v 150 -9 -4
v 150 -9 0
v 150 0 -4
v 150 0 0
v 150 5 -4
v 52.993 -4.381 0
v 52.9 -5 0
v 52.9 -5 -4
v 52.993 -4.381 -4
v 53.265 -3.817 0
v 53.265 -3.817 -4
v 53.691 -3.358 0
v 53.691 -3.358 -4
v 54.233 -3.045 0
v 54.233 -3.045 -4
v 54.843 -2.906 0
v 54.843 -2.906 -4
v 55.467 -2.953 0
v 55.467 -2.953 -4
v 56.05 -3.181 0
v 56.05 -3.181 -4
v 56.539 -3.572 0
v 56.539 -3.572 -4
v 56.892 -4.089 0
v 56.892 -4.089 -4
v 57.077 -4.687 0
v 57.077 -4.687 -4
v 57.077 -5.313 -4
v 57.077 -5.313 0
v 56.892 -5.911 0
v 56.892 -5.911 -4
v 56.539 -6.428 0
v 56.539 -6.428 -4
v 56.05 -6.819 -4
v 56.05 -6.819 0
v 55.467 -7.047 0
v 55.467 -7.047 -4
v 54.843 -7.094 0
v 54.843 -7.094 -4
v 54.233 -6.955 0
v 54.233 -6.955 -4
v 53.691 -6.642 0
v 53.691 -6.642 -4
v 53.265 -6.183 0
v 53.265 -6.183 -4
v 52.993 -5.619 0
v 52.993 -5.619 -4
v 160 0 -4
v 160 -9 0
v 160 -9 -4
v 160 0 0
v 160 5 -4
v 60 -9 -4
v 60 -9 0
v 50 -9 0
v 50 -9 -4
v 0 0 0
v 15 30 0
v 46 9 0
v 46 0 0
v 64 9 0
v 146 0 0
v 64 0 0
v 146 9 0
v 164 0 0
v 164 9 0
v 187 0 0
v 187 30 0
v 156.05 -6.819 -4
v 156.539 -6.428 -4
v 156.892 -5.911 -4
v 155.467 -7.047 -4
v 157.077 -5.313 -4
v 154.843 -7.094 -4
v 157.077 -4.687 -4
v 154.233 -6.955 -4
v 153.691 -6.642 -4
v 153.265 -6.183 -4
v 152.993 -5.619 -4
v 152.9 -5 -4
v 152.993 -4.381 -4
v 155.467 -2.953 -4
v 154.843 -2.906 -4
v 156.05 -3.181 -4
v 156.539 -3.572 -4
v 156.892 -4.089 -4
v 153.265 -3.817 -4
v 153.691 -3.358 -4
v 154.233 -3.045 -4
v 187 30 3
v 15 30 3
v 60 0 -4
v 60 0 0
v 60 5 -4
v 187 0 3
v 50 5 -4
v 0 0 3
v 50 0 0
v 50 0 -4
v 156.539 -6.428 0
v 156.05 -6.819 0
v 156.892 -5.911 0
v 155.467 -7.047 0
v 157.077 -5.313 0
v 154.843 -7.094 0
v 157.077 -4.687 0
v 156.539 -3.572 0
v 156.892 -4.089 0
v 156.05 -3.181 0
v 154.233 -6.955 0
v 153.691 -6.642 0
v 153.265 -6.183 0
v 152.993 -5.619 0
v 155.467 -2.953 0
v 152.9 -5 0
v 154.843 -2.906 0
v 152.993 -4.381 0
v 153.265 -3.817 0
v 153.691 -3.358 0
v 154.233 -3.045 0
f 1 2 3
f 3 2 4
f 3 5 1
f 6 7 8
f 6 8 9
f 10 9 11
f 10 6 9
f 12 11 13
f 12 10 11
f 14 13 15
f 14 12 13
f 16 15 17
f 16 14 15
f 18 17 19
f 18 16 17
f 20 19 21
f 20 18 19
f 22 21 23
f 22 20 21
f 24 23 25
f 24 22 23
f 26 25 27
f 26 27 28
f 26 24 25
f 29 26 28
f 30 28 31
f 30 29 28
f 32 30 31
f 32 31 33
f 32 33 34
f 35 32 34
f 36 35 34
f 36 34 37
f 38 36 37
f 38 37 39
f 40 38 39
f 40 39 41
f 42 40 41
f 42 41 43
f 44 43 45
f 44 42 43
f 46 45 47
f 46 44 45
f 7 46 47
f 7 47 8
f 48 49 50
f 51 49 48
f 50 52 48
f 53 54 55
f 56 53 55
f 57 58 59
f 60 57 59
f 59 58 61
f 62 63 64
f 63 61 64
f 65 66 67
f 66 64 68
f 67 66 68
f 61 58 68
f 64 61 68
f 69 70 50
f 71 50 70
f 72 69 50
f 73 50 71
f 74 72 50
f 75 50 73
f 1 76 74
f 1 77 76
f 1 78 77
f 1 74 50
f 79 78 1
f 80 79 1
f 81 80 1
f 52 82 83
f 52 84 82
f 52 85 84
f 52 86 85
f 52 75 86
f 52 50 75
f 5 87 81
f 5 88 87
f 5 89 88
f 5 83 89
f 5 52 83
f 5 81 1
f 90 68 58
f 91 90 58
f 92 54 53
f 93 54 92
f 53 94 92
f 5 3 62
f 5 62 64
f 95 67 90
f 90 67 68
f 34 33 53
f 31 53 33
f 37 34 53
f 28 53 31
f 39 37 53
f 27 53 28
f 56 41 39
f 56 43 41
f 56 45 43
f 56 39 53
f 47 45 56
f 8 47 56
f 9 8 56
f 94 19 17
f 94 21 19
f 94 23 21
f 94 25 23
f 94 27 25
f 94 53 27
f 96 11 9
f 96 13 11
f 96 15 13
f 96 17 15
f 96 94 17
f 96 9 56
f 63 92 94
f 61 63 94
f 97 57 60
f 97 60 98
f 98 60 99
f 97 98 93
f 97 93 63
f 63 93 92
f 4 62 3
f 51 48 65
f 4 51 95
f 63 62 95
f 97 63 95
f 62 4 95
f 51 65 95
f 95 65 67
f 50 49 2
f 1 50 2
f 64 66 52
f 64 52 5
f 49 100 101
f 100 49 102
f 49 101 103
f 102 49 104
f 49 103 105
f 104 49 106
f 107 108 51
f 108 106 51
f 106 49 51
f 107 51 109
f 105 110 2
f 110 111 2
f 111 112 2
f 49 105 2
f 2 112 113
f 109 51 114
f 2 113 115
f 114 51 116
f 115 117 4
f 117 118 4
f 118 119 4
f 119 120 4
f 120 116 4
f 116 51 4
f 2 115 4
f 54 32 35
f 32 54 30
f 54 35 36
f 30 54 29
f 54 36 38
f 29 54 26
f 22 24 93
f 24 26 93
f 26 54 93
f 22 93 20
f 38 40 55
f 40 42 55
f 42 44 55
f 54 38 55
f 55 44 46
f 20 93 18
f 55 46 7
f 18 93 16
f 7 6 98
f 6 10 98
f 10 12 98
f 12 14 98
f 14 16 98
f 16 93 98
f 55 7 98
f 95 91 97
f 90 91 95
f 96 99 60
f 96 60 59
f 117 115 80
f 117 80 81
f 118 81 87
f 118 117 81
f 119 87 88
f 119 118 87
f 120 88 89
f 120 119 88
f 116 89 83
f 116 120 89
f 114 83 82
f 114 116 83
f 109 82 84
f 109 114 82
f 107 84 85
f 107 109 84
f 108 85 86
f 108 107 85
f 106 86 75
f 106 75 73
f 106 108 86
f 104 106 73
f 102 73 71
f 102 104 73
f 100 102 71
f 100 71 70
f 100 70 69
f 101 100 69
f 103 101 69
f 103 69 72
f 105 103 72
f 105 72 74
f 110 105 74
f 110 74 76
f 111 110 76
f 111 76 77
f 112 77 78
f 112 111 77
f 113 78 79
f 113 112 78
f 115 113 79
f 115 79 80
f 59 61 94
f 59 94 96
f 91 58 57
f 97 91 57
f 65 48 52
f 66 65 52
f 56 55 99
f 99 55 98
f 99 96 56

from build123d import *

# Parameters (mm, degrees)
DODANIE_WYCI_GNI_CIE1_DEPTH       = 3
SZKIC2_W                          = 10
SZKIC2_H                          = 14
SZKIC2_R                          = 2.1
DODANIE_WYCI_GNI_CIE2_DEPTH       = 4
SFAZOWANIE1_SIZE                  = 4
SZYK_LINIOWY1_COUNT               = 2
SZYK_LINIOWY1_PITCH               = 100
SFAZOWANIE1_OF_SZYK_LINIOWY1_SIZE = 4


with BuildPart() as part:
    # Szkic1 → Dodanie-wyciągnięcie1 (new body)
    with BuildSketch(Plane.XY):
        Polygon((0, 0), (187, 0), (187, 30), (15, 30), align=None)
    extrude(amount=DODANIE_WYCI_GNI_CIE1_DEPTH)

    # Szkic2 → Dodanie-wyciągnięcie2 (add)
    with BuildSketch(Plane(origin=(0, 0, 0), x_dir=(-1, 0, 0), z_dir=(0, 0, -1))):
        with Locations((-155, -2)):
            Rectangle(SZKIC2_W, SZKIC2_H)
        with Locations((-155, -5)):
            Circle(SZKIC2_R, mode=Mode.SUBTRACT)
    dodanie_wyci_gni_cie2 = extrude(amount=DODANIE_WYCI_GNI_CIE2_DEPTH)

    # Sfazowanie1
    sfazowanie1_edges = [part.edges().sort_by_distance(p)[0] for p in [
        (160, 2.5, 0),
        (155, 5, 0),
        (150, 2.5, 0),
    ]]
    chamfer(sfazowanie1_edges, length=SFAZOWANIE1_SIZE - 0.0001)  # a hair under: the kernel refuses the full size

    # Szyk liniowy1: Dodanie-wyciągnięcie2 ×2
    with Locations(*[(-i * SZYK_LINIOWY1_PITCH, 0, 0) for i in range(1, SZYK_LINIOWY1_COUNT)]):
        add(dodanie_wyci_gni_cie2)

    # Sfazowanie1 of Szyk liniowy1
    sfazowanie1_of_szyk_liniowy1_edges = [part.edges().sort_by_distance(p)[0] for p in [
        (60, 2.5, 0),
        (55, 5, 0),
        (50, 2.5, 0),
    ]]
    chamfer(sfazowanie1_of_szyk_liniowy1_edges, length=SFAZOWANIE1_OF_SZYK_LINIOWY1_SIZE - 0.0001)  # a hair under: the kernel refuses the full size


solid = part.part
